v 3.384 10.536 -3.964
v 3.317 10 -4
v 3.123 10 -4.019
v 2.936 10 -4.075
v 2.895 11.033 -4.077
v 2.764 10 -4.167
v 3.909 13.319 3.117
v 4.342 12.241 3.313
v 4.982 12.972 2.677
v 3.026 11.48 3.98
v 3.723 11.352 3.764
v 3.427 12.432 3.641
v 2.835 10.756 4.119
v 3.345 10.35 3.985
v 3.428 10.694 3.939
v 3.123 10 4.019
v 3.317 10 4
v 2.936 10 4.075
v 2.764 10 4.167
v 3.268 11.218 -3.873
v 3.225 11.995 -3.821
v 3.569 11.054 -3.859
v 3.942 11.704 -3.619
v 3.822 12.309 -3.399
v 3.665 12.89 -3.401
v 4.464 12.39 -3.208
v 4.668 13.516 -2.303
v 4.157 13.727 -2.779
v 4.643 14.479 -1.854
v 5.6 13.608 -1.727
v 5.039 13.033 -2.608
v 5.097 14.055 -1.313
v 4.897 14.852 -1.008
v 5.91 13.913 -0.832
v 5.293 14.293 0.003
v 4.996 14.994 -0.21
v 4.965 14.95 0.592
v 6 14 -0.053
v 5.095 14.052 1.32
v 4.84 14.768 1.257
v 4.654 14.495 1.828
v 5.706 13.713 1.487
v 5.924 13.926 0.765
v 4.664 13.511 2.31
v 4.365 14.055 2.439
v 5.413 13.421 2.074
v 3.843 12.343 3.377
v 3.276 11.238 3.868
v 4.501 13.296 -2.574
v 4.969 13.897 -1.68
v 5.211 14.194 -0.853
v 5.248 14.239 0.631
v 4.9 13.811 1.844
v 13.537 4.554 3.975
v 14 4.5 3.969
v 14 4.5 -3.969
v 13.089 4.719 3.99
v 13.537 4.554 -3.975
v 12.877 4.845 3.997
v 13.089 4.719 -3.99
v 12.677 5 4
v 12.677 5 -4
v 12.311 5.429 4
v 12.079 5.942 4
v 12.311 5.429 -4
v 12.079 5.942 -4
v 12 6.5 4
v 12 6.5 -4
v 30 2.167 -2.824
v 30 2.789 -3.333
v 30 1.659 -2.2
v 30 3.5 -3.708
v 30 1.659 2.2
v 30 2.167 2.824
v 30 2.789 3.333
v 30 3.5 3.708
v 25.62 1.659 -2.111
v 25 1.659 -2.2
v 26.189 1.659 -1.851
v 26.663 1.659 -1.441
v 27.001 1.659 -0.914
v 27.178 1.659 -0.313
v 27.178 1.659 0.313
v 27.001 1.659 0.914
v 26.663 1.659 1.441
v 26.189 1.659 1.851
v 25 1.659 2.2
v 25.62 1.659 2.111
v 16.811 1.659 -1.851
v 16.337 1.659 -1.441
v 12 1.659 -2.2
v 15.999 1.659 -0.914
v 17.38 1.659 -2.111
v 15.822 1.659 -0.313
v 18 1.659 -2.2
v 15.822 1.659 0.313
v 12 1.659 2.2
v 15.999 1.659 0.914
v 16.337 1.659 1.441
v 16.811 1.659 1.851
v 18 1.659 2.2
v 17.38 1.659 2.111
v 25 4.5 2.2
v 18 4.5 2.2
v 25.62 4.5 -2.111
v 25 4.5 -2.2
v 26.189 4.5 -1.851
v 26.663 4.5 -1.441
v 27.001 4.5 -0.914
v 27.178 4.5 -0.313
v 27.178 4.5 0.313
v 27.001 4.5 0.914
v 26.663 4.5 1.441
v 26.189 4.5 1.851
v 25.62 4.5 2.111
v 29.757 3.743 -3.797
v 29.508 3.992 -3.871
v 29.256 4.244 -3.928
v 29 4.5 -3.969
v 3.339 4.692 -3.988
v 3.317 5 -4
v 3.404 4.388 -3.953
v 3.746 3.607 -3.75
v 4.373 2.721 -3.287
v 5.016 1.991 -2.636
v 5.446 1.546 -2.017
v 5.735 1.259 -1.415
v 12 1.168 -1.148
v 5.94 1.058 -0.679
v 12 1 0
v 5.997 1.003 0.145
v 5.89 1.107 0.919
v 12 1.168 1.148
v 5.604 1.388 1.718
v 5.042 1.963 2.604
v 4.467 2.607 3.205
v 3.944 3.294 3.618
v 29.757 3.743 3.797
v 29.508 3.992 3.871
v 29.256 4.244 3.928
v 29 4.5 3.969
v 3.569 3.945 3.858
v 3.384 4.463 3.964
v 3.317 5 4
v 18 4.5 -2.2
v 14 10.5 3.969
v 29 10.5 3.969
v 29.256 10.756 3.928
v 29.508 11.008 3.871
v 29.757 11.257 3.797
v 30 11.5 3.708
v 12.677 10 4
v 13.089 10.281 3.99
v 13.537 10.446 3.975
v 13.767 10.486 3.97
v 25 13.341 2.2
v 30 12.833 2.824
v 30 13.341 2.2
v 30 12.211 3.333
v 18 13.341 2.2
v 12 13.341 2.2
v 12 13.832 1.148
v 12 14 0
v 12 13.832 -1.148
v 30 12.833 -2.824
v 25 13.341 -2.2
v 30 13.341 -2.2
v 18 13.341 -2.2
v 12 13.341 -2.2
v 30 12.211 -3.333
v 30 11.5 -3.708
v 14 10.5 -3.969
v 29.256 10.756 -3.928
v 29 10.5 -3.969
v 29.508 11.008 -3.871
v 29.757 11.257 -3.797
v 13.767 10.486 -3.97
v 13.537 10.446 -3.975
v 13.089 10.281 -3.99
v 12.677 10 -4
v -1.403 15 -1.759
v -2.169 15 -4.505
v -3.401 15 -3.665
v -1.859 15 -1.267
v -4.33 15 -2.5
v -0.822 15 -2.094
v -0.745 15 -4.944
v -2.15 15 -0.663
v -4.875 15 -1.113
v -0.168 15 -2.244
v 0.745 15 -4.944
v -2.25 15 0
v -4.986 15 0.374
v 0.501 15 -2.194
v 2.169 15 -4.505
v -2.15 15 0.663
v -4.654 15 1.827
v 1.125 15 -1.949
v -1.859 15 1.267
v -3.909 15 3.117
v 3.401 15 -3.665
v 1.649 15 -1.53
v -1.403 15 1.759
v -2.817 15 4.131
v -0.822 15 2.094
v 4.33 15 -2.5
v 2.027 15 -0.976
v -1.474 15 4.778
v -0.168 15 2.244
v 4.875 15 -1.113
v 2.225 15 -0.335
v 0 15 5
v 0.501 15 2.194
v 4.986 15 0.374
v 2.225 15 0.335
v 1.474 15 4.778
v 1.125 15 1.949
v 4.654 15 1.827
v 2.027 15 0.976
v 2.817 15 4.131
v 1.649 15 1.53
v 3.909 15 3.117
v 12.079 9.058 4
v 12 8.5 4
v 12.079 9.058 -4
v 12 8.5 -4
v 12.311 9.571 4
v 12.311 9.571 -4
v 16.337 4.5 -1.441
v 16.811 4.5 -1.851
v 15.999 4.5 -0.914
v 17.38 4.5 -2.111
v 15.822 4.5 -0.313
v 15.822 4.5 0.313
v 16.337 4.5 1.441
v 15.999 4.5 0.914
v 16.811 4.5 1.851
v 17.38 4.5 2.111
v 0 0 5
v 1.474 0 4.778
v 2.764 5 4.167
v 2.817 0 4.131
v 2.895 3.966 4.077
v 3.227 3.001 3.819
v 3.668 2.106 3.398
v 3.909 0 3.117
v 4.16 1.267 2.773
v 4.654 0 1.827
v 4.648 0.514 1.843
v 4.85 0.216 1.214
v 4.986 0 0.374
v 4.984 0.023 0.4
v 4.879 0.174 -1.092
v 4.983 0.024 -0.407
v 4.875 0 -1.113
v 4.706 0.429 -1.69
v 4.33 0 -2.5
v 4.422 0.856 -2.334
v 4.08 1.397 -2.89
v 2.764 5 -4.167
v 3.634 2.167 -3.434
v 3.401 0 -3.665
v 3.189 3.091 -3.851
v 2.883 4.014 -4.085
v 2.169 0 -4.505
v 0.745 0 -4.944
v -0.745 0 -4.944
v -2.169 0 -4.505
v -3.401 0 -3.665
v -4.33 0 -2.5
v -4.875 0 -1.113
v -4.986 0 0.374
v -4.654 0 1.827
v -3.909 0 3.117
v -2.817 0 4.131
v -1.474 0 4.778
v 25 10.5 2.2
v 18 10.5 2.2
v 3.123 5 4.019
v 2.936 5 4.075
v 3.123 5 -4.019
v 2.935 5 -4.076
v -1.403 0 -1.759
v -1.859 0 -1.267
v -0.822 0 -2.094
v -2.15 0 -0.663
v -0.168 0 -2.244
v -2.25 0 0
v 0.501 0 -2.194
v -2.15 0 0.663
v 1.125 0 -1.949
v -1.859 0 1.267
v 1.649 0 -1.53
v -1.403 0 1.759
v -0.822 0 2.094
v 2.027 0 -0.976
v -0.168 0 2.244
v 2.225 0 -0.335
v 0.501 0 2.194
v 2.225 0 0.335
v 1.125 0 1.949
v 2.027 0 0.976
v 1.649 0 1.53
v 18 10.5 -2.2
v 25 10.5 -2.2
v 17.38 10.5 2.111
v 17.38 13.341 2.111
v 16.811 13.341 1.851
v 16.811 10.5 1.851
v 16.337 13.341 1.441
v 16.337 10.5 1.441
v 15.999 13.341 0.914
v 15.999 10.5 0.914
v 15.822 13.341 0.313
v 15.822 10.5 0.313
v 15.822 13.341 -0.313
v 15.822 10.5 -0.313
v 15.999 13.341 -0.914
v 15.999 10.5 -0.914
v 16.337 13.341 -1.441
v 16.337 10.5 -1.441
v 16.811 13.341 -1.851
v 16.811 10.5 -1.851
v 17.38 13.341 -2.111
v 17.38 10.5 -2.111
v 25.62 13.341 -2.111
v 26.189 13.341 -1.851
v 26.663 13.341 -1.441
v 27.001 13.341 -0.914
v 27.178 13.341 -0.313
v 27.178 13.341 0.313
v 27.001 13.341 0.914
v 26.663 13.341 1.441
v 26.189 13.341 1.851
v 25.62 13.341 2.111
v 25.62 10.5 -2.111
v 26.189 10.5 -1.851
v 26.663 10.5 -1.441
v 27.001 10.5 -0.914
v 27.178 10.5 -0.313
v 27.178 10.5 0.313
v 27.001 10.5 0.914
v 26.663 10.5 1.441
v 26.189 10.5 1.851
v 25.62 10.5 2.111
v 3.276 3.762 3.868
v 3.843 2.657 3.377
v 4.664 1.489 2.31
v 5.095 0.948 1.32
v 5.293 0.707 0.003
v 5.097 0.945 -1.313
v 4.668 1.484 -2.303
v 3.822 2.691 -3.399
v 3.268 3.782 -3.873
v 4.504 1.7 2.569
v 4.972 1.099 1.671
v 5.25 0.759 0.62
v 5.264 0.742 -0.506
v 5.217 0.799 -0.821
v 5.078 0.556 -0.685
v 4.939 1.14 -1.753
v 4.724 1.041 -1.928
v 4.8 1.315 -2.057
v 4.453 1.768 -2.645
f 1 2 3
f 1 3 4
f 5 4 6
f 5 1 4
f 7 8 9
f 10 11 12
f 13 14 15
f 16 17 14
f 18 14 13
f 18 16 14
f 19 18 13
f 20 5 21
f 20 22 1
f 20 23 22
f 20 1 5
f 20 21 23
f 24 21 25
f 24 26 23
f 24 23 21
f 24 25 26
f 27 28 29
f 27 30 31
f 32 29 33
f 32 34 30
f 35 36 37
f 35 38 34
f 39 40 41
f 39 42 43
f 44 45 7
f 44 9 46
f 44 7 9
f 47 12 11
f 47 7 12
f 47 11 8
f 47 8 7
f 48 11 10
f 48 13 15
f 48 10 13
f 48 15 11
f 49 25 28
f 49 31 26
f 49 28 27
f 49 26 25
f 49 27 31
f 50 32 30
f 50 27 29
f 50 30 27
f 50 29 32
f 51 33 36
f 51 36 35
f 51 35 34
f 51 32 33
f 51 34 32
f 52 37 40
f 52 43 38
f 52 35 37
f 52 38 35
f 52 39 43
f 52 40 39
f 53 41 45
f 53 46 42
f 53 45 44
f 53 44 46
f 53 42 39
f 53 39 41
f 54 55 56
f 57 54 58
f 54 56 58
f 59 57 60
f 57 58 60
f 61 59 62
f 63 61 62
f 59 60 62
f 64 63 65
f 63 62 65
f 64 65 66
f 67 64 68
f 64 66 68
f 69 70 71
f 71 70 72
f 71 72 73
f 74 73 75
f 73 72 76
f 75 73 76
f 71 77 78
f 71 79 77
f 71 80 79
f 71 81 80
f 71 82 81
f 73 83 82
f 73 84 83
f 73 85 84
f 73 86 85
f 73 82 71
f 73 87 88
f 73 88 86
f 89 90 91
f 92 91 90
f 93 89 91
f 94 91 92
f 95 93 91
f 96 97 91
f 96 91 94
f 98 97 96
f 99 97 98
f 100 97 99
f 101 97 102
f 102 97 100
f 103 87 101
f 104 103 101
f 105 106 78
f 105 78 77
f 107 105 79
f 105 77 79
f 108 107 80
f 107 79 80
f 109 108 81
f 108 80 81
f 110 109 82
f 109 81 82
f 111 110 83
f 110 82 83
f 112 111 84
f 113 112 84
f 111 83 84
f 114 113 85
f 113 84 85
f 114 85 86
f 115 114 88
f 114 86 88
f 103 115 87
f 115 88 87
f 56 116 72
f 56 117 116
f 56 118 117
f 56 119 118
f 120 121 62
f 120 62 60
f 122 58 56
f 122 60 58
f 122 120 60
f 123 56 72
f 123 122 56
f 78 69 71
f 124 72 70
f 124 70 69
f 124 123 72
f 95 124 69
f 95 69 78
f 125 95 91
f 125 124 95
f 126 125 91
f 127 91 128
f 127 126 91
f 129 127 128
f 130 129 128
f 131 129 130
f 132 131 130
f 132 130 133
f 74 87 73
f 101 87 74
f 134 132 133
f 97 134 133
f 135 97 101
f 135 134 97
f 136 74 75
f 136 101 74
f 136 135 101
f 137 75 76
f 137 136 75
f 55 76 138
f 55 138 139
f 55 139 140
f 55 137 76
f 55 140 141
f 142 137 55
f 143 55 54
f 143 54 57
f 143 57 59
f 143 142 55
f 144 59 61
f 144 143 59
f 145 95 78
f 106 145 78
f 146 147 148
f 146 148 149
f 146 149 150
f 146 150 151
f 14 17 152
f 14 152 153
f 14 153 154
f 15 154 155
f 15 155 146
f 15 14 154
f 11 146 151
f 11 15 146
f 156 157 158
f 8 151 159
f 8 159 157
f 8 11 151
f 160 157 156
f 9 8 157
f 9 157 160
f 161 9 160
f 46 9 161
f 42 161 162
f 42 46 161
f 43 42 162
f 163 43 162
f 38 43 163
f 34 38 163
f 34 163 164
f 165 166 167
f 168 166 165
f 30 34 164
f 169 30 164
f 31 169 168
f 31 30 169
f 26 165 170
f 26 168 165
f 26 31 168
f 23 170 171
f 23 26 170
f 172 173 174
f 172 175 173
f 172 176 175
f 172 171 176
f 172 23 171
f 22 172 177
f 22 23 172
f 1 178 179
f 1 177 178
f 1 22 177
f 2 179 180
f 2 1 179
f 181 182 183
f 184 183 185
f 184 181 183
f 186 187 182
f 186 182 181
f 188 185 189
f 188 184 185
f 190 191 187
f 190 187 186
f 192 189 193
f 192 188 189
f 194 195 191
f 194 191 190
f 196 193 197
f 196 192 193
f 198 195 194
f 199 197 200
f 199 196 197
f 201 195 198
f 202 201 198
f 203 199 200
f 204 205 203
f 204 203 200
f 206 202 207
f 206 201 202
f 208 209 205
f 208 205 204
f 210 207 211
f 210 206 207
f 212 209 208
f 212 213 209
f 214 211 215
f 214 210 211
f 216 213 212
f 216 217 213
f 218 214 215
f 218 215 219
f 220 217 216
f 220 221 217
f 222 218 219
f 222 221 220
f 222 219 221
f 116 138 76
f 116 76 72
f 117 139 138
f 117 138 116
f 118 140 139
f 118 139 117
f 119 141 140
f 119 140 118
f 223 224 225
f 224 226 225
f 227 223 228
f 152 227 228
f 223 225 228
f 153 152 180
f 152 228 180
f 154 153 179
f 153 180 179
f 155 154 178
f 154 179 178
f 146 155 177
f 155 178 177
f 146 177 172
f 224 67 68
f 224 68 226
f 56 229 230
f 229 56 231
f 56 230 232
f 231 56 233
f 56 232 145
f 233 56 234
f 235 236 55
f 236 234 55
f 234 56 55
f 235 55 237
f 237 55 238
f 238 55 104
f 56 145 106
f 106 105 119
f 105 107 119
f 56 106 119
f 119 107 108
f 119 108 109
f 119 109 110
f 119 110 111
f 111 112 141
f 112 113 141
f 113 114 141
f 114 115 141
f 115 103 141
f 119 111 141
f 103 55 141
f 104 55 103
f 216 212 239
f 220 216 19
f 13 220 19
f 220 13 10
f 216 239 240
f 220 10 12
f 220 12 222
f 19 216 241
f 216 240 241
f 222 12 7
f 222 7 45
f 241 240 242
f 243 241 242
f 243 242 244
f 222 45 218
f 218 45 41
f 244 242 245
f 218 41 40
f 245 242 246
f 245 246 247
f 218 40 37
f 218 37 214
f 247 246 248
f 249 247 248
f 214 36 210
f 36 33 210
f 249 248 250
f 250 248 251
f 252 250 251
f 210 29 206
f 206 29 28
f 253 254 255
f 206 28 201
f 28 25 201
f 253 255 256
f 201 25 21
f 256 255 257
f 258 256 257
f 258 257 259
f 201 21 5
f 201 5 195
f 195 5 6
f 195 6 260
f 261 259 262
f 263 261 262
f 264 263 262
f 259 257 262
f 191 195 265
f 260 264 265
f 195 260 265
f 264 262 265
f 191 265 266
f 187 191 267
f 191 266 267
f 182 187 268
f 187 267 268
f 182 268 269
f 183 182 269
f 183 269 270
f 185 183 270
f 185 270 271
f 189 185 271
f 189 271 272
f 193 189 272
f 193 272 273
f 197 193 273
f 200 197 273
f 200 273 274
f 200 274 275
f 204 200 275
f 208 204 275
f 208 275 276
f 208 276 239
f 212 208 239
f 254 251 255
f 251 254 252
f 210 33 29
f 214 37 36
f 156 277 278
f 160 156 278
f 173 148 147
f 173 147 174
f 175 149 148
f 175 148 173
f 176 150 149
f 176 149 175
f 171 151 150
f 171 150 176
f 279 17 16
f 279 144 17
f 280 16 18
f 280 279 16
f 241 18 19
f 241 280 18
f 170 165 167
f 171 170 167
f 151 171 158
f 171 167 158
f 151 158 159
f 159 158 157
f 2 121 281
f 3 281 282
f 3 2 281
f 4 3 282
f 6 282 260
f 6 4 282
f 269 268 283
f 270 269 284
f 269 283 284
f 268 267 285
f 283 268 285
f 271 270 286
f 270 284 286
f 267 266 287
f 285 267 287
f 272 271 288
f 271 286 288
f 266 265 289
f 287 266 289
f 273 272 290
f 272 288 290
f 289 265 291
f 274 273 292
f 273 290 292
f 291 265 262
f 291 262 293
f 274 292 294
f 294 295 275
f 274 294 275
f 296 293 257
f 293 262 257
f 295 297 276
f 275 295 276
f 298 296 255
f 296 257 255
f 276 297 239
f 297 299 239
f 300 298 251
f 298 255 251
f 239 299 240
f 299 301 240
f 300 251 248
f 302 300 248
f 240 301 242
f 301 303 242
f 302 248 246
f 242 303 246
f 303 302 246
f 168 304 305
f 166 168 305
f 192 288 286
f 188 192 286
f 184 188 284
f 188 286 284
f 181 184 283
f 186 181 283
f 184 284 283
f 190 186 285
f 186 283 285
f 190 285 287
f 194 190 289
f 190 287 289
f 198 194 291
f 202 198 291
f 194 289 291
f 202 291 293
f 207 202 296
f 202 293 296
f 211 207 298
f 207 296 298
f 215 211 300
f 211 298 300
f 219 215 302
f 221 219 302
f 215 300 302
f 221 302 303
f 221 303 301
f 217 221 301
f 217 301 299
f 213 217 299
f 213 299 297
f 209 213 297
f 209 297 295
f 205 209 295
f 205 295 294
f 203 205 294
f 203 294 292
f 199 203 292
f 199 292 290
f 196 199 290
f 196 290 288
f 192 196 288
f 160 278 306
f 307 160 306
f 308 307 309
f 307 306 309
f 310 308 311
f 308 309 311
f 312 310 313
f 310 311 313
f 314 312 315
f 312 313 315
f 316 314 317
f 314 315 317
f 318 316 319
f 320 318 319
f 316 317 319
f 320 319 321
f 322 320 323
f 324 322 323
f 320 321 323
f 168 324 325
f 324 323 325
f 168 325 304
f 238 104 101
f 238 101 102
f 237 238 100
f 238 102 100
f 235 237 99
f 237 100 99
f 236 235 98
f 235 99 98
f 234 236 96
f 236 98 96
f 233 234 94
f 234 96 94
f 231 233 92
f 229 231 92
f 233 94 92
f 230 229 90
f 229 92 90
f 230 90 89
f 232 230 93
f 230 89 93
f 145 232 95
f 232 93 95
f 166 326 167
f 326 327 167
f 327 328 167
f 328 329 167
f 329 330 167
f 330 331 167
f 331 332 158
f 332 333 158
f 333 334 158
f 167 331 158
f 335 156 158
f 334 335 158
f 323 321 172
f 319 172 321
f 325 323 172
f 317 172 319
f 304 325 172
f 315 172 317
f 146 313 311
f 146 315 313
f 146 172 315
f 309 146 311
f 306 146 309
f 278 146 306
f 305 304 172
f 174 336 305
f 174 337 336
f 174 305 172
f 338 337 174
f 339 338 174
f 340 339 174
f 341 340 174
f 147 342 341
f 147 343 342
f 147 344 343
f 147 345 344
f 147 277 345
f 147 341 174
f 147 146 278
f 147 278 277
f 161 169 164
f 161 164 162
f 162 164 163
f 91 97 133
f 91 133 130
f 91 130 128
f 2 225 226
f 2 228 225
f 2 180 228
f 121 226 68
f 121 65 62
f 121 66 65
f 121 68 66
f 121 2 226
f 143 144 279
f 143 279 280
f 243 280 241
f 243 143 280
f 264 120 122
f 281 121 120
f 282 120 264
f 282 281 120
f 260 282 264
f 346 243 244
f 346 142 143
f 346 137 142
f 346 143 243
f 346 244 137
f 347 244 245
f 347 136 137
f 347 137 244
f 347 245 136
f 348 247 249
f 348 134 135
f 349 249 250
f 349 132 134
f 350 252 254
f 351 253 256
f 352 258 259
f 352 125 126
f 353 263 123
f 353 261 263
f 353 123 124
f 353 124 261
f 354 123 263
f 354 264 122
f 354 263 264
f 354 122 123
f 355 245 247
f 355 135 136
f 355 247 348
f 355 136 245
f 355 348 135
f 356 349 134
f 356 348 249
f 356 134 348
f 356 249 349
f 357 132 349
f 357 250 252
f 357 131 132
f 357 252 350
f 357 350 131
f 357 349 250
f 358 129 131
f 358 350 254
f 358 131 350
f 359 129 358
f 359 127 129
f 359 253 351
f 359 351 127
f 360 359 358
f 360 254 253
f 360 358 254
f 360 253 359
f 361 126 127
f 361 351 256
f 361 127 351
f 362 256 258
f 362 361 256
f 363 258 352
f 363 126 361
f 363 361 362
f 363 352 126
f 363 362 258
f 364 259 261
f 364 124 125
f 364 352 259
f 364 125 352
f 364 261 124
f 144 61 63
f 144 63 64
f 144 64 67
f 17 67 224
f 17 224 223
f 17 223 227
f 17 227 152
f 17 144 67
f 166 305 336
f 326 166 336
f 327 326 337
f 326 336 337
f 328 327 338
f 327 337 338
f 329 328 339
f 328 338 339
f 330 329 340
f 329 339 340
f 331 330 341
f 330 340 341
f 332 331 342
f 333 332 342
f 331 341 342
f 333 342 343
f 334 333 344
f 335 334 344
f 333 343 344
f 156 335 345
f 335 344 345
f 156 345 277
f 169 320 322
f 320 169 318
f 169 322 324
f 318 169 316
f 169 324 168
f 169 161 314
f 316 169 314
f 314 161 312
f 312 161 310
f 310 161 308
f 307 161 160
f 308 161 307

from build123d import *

# Parameters (mm, degrees)
SKETCH2_R            = 5
BOSS_EXTRUDE1_DEPTH  = 15
BOSS_EXTRUDE2_DEPTH  = 30
CUT_EXTRUDE1_DEPTH   = 34.911650063
M4_CLEARANCE_HOLE1_D = 4.5
FILLET1_R            = 1
SKETCH8_W            = 18
SKETCH8_H            = 6
SKETCH8_H_2          = 0.659341382
CUT_EXTRUDE2_DEPTH   = 35.727510864
CHAMFER1_SIZE        = 1
FILLET2_R            = 2


with BuildPart() as part:
    # Sketch2 → Boss-Extrude1 (new body)
    with BuildSketch(Plane(origin=(0, 0, 0), x_dir=(1, 0, 0), z_dir=(0, 1, 0))):
        with Locations(Location((0, 0, 0), (0, 0, 270))):
            Circle(SKETCH2_R)
    extrude(amount=BOSS_EXTRUDE1_DEPTH)

    # Sketch3 → Boss-Extrude2 (add)
    with BuildSketch(Plane(origin=(0, 0, 0), x_dir=(0, 0, -1), z_dir=(1, 0, 0))):
        with BuildLine():
            Line((-4, 5), (-4, 10))
            ThreePointArc((-4, 10), (0, 14), (4, 10))
            Line((4, 10), (4, 5))
            ThreePointArc((4, 5), (0, 1), (-4, 5))
        make_face()
    extrude(amount=BOSS_EXTRUDE2_DEPTH)

    # Sketch5 → Cut-Extrude1 (cut, through all)
    with BuildSketch(Plane(origin=(0, 0, 0), x_dir=(1, 0, 0), z_dir=(0, 1, 0))):
        with BuildLine():
            Line((18, 2.2), (25, 2.2))
            ThreePointArc((25, 2.2), (27.2, 0), (25, -2.2))
            Line((25, -2.2), (18, -2.2))
            ThreePointArc((18, -2.2), (15.8, 0), (18, 2.2))
        make_face()
    extrude(amount=CUT_EXTRUDE1_DEPTH, mode=Mode.SUBTRACT)

    # M4 Clearance Hole1 (through all)
    with Locations(Plane(origin=(0, 15, 0), x_dir=(1, 0, 0), z_dir=(0, 1, 0))):
        with Locations((0, 0)):
            Hole(M4_CLEARANCE_HOLE1_D / 2)

    # Fillet1
    fillet1_edges = [part.edges().sort_by_distance(p)[0] for p in [
        (3, 7.5, 4),
        (16.5, 5, 4),
        (3, 7.5, -4),
        (5, 1, 0),
    ]]
    fillet(fillet1_edges, radius=FILLET1_R)

    # Sketch8 → Cut-Extrude2 (cut, through all)
    with BuildSketch(Plane.XY.offset(4)):
        with Locations((21, 7.5)):
            Rectangle(SKETCH8_W, SKETCH8_H)
        with Locations((21, 1.329670691)):
            Rectangle(SKETCH8_W, SKETCH8_H_2)
        with Locations((21, 13.670329309)):
            Rectangle(SKETCH8_W, SKETCH8_H_2)
    extrude(amount=-CUT_EXTRUDE2_DEPTH, mode=Mode.SUBTRACT)

    # Chamfer1
    chamfer1_edges = [part.edges().sort_by_distance(p)[0] for p in [
        (30, 10.5, 0),
        (30, 4.5, 0),
    ]]
    chamfer(chamfer1_edges, length=CHAMFER1_SIZE)

    # Fillet2
    fillet2_edges = [part.edges().sort_by_distance(p)[0] for p in [
        (12, 10.5, 0),
        (12, 4.5, 0),
    ]]
    fillet(fillet2_edges, radius=FILLET2_R)


solid = part.part
